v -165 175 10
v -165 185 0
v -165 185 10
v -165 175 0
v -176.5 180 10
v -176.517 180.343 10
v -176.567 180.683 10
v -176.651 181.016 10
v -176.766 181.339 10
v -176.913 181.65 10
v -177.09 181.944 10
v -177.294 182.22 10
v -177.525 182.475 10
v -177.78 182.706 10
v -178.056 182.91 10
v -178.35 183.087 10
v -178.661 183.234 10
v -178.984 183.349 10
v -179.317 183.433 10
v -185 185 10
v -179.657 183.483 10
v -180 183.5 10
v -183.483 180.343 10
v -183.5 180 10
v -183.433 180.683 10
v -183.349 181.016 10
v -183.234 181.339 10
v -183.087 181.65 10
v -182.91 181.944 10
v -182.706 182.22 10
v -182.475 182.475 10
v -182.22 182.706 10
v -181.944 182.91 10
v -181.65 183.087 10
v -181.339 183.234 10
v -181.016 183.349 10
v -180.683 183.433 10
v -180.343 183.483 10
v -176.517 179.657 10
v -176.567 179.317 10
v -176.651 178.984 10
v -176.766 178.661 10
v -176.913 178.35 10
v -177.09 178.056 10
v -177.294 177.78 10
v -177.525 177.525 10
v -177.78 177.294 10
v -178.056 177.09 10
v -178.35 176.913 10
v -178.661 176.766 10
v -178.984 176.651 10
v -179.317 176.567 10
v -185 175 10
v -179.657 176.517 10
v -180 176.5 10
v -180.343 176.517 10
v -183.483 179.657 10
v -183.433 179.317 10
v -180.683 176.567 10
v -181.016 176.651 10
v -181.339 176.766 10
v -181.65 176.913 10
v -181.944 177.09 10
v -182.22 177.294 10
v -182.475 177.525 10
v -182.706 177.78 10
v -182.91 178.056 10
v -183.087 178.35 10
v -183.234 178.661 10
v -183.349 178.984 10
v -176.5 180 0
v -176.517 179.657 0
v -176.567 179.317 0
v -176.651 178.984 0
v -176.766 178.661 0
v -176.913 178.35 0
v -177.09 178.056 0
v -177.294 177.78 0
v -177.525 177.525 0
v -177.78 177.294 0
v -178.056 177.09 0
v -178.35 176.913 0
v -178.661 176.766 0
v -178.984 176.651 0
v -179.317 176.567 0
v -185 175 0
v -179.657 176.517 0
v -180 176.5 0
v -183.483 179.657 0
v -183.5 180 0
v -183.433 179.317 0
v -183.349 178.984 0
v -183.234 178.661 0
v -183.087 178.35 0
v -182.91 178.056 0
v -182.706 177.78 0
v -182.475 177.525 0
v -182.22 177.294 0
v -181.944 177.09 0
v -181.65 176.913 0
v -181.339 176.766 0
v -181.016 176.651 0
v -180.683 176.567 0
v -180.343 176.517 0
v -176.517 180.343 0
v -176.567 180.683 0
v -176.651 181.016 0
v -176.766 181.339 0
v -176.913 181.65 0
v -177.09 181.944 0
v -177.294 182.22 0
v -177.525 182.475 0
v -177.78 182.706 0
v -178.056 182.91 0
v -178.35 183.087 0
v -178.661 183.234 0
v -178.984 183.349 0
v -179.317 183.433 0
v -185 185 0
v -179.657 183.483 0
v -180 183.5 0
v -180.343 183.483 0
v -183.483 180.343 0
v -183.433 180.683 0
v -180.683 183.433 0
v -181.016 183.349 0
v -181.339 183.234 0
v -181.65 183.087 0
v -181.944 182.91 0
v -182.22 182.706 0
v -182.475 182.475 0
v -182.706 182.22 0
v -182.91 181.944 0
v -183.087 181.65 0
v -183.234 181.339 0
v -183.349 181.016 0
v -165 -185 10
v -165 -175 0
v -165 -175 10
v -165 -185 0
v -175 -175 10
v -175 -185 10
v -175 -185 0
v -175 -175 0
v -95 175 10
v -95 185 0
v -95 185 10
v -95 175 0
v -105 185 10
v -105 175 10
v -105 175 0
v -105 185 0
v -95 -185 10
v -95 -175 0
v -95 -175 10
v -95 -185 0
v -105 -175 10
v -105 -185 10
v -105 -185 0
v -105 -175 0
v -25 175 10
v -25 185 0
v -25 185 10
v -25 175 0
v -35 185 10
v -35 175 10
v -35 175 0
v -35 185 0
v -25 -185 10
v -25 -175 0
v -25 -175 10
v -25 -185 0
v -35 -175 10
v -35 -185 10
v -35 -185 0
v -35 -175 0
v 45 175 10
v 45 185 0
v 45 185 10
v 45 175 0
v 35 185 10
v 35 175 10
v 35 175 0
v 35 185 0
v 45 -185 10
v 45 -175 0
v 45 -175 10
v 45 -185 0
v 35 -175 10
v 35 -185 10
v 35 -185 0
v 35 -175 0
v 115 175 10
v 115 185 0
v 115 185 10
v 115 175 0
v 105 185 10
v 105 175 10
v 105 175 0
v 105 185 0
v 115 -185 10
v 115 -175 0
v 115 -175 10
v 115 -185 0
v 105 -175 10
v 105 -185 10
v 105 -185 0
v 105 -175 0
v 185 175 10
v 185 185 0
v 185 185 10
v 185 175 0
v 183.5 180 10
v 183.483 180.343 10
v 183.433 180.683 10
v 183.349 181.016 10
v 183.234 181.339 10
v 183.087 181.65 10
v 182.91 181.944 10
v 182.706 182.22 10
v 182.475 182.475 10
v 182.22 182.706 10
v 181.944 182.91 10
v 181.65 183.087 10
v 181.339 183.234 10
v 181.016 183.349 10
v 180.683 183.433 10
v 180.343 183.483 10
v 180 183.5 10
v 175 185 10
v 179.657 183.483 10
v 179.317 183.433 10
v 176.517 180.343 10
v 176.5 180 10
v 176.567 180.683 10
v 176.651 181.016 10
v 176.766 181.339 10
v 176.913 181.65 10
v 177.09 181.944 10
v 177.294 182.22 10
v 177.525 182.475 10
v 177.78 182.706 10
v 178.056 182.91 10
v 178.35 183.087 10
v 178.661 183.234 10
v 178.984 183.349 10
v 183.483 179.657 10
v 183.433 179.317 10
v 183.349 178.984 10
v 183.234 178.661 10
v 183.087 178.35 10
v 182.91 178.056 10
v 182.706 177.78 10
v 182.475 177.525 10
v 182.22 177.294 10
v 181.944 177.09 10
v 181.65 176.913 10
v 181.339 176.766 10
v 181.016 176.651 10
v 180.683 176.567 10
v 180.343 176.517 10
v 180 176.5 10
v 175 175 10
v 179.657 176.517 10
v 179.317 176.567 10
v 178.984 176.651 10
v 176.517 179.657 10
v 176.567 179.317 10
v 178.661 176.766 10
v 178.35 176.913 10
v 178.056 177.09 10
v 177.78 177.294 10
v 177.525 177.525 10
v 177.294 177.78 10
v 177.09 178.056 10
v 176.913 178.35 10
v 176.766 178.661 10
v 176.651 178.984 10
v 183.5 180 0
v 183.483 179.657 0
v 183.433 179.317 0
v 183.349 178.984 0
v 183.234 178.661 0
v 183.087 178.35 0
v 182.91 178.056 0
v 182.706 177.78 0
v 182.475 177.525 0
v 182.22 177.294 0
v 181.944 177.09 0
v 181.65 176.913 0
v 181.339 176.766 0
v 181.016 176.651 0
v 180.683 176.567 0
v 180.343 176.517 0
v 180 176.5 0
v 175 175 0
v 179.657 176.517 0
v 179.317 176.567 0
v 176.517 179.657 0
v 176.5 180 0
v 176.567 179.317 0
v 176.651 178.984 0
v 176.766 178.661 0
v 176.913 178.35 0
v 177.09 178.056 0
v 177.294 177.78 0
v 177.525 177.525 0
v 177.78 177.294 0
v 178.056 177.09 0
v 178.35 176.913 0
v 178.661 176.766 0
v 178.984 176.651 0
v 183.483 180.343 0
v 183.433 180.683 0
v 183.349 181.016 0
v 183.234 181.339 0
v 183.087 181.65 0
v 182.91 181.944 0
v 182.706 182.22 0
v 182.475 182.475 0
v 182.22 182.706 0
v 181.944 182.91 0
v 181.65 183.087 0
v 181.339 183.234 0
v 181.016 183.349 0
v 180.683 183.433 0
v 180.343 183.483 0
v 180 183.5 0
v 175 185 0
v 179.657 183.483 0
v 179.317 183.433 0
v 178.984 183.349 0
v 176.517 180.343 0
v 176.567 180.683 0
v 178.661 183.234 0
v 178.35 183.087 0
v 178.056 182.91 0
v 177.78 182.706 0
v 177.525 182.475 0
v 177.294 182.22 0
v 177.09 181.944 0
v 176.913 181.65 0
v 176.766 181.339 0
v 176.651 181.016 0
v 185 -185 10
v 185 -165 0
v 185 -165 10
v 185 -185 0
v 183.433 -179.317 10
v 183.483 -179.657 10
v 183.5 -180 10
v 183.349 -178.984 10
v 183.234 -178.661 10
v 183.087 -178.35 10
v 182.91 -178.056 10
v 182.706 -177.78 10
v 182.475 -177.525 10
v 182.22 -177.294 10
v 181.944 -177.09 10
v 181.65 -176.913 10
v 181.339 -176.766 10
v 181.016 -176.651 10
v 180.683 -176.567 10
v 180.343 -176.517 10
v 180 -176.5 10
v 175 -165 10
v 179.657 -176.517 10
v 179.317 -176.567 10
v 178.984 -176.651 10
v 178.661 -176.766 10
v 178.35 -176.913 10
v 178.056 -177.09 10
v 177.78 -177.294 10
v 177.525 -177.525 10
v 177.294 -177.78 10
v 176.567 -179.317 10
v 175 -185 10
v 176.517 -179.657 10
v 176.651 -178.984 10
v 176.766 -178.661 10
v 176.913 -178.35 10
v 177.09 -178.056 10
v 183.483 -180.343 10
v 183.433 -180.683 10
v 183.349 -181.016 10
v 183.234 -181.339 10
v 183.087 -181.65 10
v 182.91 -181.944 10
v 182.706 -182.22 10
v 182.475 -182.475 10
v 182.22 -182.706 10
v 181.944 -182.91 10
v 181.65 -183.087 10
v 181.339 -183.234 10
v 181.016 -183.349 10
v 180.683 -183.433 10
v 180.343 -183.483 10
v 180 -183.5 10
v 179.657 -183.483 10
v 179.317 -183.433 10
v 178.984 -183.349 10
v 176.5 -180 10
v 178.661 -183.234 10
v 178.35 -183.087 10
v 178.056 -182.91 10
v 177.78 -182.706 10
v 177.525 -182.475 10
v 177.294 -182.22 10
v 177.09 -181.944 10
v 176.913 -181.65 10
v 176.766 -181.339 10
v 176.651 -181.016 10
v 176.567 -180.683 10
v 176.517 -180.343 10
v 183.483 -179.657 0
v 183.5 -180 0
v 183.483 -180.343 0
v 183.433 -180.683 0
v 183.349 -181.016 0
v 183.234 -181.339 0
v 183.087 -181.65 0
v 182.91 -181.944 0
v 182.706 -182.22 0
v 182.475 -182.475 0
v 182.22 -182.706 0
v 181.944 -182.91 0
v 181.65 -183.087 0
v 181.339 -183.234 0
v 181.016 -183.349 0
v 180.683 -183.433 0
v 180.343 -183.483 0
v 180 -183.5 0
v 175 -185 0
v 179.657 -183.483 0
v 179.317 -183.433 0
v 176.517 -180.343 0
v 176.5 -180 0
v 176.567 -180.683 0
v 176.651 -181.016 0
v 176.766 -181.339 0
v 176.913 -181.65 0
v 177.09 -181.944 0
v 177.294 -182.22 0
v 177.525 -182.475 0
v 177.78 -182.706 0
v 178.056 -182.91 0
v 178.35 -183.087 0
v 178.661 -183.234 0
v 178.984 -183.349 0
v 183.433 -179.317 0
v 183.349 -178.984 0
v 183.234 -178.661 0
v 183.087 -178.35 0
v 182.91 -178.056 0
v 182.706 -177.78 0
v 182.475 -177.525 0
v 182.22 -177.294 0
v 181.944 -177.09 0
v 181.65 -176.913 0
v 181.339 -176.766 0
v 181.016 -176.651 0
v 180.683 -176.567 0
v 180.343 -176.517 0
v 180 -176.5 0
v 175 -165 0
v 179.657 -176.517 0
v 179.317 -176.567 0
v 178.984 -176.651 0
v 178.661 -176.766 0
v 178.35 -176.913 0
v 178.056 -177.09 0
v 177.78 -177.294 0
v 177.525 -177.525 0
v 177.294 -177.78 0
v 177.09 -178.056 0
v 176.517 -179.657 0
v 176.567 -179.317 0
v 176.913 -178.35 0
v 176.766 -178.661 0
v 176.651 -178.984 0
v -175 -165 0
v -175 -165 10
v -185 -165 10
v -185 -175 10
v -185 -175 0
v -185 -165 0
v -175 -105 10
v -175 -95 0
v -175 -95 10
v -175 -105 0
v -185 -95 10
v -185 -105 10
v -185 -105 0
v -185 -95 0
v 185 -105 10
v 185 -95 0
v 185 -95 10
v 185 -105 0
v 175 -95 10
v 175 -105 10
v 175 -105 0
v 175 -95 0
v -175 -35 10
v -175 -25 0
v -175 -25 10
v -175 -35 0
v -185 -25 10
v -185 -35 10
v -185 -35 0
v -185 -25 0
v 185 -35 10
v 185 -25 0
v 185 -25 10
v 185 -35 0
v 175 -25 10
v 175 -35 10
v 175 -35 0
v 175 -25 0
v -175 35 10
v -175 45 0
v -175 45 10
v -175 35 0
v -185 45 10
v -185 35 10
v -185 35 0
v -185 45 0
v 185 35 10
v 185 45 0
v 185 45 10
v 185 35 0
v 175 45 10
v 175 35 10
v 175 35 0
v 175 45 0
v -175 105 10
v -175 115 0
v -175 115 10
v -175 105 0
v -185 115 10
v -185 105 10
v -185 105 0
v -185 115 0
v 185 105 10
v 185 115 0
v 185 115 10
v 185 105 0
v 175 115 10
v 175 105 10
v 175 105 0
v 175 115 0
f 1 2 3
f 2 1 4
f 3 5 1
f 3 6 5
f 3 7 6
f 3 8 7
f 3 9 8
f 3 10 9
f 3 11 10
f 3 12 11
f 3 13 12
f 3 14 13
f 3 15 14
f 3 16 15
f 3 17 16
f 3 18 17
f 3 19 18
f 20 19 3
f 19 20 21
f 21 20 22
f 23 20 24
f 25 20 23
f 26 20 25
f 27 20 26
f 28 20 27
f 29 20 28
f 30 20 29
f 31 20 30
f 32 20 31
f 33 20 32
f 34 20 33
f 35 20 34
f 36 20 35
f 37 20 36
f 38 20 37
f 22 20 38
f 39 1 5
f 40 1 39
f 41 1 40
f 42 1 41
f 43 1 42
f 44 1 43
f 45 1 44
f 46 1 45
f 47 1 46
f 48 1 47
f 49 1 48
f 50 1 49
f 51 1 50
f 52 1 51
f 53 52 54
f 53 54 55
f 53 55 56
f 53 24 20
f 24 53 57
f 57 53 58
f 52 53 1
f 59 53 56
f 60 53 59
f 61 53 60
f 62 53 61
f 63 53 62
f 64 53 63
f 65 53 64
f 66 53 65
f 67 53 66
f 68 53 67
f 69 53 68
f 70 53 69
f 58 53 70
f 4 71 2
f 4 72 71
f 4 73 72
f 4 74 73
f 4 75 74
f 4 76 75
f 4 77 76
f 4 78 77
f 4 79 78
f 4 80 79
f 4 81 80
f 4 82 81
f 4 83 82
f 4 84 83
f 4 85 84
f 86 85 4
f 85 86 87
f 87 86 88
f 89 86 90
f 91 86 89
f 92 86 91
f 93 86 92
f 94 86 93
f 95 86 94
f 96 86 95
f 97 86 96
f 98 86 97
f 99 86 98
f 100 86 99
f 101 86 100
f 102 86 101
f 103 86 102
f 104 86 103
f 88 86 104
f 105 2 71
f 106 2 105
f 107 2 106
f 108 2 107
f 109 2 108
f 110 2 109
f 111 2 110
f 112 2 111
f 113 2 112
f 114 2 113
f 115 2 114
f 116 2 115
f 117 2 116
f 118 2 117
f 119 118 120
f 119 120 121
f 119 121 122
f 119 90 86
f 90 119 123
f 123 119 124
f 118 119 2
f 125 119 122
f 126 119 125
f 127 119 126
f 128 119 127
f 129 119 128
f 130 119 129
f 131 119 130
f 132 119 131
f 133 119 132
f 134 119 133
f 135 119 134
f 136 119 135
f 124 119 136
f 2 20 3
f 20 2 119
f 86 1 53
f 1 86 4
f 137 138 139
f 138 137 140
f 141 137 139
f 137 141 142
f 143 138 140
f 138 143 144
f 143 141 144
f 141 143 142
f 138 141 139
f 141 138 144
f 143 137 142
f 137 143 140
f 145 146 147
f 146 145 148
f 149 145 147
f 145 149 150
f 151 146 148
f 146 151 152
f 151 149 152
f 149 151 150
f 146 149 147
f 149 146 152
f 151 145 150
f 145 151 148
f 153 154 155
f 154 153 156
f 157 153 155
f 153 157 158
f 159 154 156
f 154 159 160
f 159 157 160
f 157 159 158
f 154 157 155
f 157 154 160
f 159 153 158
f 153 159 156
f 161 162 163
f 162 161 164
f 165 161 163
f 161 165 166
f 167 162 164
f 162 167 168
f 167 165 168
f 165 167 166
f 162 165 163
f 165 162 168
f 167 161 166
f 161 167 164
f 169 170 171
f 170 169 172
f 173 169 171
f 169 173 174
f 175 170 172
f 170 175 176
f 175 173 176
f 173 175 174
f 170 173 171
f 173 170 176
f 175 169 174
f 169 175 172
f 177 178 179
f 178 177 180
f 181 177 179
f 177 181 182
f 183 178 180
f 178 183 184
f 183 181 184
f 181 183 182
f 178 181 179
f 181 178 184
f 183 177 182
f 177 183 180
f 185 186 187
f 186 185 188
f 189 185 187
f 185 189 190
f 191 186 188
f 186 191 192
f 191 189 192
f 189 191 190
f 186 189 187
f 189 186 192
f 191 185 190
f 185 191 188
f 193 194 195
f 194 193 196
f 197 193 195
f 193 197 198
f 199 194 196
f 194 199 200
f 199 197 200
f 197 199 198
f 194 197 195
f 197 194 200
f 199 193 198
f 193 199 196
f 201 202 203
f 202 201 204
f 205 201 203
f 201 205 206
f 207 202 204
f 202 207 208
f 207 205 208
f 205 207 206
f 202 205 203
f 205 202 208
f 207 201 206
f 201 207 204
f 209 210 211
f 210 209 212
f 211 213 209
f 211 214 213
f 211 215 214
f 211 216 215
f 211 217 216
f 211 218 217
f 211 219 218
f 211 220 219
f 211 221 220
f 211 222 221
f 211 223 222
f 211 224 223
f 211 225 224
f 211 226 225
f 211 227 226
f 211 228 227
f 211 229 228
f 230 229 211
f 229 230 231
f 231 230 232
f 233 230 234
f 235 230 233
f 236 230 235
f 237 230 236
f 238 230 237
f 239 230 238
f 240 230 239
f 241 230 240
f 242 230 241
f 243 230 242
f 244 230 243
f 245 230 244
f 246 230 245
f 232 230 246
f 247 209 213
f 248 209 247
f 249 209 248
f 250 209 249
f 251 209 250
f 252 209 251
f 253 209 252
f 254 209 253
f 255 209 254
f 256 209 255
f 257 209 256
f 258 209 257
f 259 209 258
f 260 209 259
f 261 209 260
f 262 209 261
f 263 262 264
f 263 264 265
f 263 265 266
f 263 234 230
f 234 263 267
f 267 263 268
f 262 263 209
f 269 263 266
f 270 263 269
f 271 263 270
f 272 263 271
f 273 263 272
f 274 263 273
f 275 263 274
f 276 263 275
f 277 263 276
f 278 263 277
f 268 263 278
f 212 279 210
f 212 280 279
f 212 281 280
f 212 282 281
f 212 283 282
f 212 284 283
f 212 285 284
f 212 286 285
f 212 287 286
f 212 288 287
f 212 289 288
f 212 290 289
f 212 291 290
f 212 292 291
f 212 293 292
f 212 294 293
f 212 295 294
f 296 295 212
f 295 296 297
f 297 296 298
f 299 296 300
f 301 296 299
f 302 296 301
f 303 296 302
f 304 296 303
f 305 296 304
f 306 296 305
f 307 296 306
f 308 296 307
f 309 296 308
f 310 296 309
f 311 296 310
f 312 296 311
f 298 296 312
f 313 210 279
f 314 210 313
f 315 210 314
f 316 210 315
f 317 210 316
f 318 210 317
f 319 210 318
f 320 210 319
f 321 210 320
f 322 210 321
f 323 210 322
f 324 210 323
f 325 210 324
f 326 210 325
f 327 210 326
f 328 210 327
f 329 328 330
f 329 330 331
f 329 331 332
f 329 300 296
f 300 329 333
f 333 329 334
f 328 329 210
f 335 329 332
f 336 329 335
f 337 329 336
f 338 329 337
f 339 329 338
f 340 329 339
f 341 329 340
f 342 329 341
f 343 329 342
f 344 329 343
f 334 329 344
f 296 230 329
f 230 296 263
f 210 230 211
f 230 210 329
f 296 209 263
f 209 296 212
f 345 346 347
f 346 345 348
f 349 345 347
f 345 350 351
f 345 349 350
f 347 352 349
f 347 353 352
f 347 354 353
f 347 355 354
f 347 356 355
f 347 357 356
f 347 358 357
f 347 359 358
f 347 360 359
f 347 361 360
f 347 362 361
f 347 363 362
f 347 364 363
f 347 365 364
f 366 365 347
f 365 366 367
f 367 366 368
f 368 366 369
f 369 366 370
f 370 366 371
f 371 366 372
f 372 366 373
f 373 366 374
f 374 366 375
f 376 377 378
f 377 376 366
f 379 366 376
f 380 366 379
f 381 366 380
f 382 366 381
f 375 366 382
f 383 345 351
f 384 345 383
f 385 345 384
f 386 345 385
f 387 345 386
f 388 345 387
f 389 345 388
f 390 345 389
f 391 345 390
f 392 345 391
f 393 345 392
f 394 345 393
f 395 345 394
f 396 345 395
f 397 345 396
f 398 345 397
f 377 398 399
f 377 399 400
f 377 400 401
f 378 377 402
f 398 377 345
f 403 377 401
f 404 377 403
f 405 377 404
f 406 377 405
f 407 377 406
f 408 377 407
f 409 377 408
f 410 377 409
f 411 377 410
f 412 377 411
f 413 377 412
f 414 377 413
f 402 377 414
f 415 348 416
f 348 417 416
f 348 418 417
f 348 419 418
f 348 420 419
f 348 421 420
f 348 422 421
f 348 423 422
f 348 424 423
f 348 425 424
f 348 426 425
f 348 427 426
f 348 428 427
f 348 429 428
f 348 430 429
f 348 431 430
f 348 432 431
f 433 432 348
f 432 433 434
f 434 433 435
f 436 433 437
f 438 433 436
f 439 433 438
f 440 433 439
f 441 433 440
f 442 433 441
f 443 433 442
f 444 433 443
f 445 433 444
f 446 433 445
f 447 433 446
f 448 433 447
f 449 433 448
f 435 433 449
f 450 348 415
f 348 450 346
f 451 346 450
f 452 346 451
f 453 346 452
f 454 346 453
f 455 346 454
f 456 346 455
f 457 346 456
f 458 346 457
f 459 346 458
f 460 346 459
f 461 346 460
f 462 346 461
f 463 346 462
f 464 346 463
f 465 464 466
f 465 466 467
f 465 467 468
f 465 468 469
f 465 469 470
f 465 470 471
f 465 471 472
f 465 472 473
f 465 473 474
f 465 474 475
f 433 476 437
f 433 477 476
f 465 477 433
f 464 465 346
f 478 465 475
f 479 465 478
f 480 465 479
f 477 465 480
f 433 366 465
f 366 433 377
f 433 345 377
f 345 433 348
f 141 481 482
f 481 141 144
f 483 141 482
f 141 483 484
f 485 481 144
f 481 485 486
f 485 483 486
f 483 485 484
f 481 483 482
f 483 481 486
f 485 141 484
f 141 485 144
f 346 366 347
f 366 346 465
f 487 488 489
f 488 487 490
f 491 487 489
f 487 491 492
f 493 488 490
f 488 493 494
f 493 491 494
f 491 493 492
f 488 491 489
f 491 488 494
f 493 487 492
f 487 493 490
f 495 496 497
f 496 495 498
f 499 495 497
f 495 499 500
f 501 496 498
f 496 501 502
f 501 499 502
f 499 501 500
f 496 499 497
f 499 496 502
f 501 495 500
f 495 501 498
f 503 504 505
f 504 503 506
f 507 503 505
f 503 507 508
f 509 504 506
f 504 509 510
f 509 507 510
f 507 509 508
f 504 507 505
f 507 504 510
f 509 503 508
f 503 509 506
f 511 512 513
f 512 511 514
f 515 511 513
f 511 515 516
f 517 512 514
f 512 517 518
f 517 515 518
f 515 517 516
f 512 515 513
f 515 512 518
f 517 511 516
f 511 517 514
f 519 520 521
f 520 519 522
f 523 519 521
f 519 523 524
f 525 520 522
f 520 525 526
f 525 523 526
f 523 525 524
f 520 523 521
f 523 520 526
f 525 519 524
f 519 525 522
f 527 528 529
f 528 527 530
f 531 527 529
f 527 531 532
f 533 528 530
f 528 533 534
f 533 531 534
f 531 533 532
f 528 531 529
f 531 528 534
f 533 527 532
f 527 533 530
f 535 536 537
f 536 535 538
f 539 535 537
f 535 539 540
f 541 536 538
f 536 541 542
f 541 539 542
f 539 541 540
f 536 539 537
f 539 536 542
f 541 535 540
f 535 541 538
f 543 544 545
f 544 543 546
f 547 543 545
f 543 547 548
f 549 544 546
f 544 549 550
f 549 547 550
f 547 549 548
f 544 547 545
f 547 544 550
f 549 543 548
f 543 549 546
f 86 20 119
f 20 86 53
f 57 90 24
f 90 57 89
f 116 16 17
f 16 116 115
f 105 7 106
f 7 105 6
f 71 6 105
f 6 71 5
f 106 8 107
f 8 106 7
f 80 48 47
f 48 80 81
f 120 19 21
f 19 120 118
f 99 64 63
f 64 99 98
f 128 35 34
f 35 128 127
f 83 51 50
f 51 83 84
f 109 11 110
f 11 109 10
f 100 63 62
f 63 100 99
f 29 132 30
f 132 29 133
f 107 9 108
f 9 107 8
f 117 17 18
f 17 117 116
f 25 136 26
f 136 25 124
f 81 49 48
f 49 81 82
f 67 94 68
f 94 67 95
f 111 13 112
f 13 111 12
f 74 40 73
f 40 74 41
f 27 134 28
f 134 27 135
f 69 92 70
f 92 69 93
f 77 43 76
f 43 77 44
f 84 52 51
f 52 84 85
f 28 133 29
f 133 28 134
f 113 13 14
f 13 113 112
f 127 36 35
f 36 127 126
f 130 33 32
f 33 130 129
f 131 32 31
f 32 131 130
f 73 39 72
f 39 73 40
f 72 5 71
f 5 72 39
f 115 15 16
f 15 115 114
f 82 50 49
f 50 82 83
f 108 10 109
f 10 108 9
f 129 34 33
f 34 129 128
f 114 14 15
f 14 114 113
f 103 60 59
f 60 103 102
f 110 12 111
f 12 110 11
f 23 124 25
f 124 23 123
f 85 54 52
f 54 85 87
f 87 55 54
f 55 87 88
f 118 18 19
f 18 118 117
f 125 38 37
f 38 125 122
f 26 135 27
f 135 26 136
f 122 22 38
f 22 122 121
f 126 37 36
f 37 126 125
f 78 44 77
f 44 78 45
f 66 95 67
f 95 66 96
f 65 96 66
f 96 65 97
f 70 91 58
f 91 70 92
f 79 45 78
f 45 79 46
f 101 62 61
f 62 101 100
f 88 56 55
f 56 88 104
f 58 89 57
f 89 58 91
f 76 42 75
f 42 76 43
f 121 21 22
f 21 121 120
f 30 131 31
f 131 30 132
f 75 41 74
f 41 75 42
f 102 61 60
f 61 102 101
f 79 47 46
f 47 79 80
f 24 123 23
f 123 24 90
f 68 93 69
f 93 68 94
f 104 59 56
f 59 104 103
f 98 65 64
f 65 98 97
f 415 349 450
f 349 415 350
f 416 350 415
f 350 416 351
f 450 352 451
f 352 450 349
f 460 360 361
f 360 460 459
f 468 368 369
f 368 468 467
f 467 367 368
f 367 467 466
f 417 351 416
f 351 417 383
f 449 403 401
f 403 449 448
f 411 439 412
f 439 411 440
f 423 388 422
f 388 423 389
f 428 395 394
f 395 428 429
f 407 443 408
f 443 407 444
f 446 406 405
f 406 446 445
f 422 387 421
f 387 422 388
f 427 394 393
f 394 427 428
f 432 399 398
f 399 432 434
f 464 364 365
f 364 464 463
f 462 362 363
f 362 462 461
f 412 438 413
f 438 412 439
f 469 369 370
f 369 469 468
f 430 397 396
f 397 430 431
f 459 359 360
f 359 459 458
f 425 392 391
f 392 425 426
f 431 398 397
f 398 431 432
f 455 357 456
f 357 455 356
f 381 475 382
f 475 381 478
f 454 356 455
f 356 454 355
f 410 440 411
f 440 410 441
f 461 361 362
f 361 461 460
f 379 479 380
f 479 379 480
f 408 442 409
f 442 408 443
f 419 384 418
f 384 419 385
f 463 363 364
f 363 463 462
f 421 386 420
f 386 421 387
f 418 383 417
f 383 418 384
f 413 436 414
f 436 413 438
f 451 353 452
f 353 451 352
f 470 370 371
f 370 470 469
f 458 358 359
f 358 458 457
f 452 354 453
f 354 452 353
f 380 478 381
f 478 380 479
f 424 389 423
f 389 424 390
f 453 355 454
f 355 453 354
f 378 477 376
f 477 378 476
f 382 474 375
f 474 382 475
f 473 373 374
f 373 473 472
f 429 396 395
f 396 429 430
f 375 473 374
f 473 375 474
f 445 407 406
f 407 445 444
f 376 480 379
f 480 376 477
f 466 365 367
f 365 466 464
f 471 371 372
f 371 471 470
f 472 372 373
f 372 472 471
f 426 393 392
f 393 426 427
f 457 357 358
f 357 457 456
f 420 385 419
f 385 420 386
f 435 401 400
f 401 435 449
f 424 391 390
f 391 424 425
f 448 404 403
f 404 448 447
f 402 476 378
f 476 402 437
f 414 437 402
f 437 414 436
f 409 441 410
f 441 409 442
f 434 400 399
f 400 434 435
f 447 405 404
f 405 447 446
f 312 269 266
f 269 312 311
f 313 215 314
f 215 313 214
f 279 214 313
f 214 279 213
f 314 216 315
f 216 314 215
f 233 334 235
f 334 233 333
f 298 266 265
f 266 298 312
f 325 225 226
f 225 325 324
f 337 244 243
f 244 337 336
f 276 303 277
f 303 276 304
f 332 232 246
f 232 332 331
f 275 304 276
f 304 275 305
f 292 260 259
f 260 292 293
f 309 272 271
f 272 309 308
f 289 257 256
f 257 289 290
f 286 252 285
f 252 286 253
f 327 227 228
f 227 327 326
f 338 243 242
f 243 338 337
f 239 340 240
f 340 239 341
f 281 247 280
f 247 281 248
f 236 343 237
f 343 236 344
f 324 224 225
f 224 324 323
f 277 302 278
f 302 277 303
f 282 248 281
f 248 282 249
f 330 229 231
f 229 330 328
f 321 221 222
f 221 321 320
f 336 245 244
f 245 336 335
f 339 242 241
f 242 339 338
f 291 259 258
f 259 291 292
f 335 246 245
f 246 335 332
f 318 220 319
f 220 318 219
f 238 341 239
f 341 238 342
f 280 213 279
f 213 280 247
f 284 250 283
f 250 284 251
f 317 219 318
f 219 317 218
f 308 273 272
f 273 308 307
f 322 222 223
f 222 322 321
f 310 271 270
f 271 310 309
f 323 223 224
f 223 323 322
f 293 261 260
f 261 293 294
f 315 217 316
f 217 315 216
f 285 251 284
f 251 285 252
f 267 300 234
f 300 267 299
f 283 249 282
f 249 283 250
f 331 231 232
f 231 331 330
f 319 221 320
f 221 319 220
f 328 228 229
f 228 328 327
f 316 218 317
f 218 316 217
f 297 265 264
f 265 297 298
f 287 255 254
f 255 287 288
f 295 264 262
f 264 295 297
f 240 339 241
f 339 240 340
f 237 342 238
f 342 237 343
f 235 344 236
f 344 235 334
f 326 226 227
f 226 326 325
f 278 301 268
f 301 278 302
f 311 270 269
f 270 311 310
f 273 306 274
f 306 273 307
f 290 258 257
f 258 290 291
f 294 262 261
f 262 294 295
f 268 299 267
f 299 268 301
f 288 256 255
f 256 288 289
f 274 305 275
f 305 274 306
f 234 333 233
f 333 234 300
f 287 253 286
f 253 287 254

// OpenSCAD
// ring_34.scad - ring index 34 (z bottom = 340 mm)
$fn = 64; bar = 10; half_b = bar/2; outer = 370; half_outer = outer/2;
front_y = 180; back_y = -180; left_x = -180; right_x = 180;
x_centers = [-170, -100, -30, 40, 110, 180];
z_centers = [5, 85, 155, 225, 295, 365, 435, 505, 575, 645, 715]; ring_z = 340;
module place_box(cx, cy, sx, sy) { translate([cx - sx/2, cy - sy/2, 0]) cube([sx, sy, bar]); }

difference() { union() {
    for (x = x_centers) { place_box(x, front_y, bar, bar); place_box(x, back_y, bar, bar); }
    for (y = x_centers) { place_box(left_x, y, bar, bar); place_box(right_x, y, bar, bar); }
    for (zc = z_centers) if ((zc - half_b < ring_z + bar) && (zc + half_b > ring_z)) {
        translate([-half_outer, front_y - half_b, 0]) cube([outer, bar, bar]);
        translate([-half_outer, back_y - half_b, 0])  cube([outer, bar, bar]);
        translate([left_x - half_b, -half_outer, 0])  cube([bar, outer, bar]);
        translate([right_x - half_b, -half_outer, 0]) cube([bar, outer, bar]);
    }
  }
  for (cx = [-180, 180]) for (cy = [-180, 180]) translate([cx, cy, 0]) cylinder(h = bar, r = 3.5, $fn = 64);
}
